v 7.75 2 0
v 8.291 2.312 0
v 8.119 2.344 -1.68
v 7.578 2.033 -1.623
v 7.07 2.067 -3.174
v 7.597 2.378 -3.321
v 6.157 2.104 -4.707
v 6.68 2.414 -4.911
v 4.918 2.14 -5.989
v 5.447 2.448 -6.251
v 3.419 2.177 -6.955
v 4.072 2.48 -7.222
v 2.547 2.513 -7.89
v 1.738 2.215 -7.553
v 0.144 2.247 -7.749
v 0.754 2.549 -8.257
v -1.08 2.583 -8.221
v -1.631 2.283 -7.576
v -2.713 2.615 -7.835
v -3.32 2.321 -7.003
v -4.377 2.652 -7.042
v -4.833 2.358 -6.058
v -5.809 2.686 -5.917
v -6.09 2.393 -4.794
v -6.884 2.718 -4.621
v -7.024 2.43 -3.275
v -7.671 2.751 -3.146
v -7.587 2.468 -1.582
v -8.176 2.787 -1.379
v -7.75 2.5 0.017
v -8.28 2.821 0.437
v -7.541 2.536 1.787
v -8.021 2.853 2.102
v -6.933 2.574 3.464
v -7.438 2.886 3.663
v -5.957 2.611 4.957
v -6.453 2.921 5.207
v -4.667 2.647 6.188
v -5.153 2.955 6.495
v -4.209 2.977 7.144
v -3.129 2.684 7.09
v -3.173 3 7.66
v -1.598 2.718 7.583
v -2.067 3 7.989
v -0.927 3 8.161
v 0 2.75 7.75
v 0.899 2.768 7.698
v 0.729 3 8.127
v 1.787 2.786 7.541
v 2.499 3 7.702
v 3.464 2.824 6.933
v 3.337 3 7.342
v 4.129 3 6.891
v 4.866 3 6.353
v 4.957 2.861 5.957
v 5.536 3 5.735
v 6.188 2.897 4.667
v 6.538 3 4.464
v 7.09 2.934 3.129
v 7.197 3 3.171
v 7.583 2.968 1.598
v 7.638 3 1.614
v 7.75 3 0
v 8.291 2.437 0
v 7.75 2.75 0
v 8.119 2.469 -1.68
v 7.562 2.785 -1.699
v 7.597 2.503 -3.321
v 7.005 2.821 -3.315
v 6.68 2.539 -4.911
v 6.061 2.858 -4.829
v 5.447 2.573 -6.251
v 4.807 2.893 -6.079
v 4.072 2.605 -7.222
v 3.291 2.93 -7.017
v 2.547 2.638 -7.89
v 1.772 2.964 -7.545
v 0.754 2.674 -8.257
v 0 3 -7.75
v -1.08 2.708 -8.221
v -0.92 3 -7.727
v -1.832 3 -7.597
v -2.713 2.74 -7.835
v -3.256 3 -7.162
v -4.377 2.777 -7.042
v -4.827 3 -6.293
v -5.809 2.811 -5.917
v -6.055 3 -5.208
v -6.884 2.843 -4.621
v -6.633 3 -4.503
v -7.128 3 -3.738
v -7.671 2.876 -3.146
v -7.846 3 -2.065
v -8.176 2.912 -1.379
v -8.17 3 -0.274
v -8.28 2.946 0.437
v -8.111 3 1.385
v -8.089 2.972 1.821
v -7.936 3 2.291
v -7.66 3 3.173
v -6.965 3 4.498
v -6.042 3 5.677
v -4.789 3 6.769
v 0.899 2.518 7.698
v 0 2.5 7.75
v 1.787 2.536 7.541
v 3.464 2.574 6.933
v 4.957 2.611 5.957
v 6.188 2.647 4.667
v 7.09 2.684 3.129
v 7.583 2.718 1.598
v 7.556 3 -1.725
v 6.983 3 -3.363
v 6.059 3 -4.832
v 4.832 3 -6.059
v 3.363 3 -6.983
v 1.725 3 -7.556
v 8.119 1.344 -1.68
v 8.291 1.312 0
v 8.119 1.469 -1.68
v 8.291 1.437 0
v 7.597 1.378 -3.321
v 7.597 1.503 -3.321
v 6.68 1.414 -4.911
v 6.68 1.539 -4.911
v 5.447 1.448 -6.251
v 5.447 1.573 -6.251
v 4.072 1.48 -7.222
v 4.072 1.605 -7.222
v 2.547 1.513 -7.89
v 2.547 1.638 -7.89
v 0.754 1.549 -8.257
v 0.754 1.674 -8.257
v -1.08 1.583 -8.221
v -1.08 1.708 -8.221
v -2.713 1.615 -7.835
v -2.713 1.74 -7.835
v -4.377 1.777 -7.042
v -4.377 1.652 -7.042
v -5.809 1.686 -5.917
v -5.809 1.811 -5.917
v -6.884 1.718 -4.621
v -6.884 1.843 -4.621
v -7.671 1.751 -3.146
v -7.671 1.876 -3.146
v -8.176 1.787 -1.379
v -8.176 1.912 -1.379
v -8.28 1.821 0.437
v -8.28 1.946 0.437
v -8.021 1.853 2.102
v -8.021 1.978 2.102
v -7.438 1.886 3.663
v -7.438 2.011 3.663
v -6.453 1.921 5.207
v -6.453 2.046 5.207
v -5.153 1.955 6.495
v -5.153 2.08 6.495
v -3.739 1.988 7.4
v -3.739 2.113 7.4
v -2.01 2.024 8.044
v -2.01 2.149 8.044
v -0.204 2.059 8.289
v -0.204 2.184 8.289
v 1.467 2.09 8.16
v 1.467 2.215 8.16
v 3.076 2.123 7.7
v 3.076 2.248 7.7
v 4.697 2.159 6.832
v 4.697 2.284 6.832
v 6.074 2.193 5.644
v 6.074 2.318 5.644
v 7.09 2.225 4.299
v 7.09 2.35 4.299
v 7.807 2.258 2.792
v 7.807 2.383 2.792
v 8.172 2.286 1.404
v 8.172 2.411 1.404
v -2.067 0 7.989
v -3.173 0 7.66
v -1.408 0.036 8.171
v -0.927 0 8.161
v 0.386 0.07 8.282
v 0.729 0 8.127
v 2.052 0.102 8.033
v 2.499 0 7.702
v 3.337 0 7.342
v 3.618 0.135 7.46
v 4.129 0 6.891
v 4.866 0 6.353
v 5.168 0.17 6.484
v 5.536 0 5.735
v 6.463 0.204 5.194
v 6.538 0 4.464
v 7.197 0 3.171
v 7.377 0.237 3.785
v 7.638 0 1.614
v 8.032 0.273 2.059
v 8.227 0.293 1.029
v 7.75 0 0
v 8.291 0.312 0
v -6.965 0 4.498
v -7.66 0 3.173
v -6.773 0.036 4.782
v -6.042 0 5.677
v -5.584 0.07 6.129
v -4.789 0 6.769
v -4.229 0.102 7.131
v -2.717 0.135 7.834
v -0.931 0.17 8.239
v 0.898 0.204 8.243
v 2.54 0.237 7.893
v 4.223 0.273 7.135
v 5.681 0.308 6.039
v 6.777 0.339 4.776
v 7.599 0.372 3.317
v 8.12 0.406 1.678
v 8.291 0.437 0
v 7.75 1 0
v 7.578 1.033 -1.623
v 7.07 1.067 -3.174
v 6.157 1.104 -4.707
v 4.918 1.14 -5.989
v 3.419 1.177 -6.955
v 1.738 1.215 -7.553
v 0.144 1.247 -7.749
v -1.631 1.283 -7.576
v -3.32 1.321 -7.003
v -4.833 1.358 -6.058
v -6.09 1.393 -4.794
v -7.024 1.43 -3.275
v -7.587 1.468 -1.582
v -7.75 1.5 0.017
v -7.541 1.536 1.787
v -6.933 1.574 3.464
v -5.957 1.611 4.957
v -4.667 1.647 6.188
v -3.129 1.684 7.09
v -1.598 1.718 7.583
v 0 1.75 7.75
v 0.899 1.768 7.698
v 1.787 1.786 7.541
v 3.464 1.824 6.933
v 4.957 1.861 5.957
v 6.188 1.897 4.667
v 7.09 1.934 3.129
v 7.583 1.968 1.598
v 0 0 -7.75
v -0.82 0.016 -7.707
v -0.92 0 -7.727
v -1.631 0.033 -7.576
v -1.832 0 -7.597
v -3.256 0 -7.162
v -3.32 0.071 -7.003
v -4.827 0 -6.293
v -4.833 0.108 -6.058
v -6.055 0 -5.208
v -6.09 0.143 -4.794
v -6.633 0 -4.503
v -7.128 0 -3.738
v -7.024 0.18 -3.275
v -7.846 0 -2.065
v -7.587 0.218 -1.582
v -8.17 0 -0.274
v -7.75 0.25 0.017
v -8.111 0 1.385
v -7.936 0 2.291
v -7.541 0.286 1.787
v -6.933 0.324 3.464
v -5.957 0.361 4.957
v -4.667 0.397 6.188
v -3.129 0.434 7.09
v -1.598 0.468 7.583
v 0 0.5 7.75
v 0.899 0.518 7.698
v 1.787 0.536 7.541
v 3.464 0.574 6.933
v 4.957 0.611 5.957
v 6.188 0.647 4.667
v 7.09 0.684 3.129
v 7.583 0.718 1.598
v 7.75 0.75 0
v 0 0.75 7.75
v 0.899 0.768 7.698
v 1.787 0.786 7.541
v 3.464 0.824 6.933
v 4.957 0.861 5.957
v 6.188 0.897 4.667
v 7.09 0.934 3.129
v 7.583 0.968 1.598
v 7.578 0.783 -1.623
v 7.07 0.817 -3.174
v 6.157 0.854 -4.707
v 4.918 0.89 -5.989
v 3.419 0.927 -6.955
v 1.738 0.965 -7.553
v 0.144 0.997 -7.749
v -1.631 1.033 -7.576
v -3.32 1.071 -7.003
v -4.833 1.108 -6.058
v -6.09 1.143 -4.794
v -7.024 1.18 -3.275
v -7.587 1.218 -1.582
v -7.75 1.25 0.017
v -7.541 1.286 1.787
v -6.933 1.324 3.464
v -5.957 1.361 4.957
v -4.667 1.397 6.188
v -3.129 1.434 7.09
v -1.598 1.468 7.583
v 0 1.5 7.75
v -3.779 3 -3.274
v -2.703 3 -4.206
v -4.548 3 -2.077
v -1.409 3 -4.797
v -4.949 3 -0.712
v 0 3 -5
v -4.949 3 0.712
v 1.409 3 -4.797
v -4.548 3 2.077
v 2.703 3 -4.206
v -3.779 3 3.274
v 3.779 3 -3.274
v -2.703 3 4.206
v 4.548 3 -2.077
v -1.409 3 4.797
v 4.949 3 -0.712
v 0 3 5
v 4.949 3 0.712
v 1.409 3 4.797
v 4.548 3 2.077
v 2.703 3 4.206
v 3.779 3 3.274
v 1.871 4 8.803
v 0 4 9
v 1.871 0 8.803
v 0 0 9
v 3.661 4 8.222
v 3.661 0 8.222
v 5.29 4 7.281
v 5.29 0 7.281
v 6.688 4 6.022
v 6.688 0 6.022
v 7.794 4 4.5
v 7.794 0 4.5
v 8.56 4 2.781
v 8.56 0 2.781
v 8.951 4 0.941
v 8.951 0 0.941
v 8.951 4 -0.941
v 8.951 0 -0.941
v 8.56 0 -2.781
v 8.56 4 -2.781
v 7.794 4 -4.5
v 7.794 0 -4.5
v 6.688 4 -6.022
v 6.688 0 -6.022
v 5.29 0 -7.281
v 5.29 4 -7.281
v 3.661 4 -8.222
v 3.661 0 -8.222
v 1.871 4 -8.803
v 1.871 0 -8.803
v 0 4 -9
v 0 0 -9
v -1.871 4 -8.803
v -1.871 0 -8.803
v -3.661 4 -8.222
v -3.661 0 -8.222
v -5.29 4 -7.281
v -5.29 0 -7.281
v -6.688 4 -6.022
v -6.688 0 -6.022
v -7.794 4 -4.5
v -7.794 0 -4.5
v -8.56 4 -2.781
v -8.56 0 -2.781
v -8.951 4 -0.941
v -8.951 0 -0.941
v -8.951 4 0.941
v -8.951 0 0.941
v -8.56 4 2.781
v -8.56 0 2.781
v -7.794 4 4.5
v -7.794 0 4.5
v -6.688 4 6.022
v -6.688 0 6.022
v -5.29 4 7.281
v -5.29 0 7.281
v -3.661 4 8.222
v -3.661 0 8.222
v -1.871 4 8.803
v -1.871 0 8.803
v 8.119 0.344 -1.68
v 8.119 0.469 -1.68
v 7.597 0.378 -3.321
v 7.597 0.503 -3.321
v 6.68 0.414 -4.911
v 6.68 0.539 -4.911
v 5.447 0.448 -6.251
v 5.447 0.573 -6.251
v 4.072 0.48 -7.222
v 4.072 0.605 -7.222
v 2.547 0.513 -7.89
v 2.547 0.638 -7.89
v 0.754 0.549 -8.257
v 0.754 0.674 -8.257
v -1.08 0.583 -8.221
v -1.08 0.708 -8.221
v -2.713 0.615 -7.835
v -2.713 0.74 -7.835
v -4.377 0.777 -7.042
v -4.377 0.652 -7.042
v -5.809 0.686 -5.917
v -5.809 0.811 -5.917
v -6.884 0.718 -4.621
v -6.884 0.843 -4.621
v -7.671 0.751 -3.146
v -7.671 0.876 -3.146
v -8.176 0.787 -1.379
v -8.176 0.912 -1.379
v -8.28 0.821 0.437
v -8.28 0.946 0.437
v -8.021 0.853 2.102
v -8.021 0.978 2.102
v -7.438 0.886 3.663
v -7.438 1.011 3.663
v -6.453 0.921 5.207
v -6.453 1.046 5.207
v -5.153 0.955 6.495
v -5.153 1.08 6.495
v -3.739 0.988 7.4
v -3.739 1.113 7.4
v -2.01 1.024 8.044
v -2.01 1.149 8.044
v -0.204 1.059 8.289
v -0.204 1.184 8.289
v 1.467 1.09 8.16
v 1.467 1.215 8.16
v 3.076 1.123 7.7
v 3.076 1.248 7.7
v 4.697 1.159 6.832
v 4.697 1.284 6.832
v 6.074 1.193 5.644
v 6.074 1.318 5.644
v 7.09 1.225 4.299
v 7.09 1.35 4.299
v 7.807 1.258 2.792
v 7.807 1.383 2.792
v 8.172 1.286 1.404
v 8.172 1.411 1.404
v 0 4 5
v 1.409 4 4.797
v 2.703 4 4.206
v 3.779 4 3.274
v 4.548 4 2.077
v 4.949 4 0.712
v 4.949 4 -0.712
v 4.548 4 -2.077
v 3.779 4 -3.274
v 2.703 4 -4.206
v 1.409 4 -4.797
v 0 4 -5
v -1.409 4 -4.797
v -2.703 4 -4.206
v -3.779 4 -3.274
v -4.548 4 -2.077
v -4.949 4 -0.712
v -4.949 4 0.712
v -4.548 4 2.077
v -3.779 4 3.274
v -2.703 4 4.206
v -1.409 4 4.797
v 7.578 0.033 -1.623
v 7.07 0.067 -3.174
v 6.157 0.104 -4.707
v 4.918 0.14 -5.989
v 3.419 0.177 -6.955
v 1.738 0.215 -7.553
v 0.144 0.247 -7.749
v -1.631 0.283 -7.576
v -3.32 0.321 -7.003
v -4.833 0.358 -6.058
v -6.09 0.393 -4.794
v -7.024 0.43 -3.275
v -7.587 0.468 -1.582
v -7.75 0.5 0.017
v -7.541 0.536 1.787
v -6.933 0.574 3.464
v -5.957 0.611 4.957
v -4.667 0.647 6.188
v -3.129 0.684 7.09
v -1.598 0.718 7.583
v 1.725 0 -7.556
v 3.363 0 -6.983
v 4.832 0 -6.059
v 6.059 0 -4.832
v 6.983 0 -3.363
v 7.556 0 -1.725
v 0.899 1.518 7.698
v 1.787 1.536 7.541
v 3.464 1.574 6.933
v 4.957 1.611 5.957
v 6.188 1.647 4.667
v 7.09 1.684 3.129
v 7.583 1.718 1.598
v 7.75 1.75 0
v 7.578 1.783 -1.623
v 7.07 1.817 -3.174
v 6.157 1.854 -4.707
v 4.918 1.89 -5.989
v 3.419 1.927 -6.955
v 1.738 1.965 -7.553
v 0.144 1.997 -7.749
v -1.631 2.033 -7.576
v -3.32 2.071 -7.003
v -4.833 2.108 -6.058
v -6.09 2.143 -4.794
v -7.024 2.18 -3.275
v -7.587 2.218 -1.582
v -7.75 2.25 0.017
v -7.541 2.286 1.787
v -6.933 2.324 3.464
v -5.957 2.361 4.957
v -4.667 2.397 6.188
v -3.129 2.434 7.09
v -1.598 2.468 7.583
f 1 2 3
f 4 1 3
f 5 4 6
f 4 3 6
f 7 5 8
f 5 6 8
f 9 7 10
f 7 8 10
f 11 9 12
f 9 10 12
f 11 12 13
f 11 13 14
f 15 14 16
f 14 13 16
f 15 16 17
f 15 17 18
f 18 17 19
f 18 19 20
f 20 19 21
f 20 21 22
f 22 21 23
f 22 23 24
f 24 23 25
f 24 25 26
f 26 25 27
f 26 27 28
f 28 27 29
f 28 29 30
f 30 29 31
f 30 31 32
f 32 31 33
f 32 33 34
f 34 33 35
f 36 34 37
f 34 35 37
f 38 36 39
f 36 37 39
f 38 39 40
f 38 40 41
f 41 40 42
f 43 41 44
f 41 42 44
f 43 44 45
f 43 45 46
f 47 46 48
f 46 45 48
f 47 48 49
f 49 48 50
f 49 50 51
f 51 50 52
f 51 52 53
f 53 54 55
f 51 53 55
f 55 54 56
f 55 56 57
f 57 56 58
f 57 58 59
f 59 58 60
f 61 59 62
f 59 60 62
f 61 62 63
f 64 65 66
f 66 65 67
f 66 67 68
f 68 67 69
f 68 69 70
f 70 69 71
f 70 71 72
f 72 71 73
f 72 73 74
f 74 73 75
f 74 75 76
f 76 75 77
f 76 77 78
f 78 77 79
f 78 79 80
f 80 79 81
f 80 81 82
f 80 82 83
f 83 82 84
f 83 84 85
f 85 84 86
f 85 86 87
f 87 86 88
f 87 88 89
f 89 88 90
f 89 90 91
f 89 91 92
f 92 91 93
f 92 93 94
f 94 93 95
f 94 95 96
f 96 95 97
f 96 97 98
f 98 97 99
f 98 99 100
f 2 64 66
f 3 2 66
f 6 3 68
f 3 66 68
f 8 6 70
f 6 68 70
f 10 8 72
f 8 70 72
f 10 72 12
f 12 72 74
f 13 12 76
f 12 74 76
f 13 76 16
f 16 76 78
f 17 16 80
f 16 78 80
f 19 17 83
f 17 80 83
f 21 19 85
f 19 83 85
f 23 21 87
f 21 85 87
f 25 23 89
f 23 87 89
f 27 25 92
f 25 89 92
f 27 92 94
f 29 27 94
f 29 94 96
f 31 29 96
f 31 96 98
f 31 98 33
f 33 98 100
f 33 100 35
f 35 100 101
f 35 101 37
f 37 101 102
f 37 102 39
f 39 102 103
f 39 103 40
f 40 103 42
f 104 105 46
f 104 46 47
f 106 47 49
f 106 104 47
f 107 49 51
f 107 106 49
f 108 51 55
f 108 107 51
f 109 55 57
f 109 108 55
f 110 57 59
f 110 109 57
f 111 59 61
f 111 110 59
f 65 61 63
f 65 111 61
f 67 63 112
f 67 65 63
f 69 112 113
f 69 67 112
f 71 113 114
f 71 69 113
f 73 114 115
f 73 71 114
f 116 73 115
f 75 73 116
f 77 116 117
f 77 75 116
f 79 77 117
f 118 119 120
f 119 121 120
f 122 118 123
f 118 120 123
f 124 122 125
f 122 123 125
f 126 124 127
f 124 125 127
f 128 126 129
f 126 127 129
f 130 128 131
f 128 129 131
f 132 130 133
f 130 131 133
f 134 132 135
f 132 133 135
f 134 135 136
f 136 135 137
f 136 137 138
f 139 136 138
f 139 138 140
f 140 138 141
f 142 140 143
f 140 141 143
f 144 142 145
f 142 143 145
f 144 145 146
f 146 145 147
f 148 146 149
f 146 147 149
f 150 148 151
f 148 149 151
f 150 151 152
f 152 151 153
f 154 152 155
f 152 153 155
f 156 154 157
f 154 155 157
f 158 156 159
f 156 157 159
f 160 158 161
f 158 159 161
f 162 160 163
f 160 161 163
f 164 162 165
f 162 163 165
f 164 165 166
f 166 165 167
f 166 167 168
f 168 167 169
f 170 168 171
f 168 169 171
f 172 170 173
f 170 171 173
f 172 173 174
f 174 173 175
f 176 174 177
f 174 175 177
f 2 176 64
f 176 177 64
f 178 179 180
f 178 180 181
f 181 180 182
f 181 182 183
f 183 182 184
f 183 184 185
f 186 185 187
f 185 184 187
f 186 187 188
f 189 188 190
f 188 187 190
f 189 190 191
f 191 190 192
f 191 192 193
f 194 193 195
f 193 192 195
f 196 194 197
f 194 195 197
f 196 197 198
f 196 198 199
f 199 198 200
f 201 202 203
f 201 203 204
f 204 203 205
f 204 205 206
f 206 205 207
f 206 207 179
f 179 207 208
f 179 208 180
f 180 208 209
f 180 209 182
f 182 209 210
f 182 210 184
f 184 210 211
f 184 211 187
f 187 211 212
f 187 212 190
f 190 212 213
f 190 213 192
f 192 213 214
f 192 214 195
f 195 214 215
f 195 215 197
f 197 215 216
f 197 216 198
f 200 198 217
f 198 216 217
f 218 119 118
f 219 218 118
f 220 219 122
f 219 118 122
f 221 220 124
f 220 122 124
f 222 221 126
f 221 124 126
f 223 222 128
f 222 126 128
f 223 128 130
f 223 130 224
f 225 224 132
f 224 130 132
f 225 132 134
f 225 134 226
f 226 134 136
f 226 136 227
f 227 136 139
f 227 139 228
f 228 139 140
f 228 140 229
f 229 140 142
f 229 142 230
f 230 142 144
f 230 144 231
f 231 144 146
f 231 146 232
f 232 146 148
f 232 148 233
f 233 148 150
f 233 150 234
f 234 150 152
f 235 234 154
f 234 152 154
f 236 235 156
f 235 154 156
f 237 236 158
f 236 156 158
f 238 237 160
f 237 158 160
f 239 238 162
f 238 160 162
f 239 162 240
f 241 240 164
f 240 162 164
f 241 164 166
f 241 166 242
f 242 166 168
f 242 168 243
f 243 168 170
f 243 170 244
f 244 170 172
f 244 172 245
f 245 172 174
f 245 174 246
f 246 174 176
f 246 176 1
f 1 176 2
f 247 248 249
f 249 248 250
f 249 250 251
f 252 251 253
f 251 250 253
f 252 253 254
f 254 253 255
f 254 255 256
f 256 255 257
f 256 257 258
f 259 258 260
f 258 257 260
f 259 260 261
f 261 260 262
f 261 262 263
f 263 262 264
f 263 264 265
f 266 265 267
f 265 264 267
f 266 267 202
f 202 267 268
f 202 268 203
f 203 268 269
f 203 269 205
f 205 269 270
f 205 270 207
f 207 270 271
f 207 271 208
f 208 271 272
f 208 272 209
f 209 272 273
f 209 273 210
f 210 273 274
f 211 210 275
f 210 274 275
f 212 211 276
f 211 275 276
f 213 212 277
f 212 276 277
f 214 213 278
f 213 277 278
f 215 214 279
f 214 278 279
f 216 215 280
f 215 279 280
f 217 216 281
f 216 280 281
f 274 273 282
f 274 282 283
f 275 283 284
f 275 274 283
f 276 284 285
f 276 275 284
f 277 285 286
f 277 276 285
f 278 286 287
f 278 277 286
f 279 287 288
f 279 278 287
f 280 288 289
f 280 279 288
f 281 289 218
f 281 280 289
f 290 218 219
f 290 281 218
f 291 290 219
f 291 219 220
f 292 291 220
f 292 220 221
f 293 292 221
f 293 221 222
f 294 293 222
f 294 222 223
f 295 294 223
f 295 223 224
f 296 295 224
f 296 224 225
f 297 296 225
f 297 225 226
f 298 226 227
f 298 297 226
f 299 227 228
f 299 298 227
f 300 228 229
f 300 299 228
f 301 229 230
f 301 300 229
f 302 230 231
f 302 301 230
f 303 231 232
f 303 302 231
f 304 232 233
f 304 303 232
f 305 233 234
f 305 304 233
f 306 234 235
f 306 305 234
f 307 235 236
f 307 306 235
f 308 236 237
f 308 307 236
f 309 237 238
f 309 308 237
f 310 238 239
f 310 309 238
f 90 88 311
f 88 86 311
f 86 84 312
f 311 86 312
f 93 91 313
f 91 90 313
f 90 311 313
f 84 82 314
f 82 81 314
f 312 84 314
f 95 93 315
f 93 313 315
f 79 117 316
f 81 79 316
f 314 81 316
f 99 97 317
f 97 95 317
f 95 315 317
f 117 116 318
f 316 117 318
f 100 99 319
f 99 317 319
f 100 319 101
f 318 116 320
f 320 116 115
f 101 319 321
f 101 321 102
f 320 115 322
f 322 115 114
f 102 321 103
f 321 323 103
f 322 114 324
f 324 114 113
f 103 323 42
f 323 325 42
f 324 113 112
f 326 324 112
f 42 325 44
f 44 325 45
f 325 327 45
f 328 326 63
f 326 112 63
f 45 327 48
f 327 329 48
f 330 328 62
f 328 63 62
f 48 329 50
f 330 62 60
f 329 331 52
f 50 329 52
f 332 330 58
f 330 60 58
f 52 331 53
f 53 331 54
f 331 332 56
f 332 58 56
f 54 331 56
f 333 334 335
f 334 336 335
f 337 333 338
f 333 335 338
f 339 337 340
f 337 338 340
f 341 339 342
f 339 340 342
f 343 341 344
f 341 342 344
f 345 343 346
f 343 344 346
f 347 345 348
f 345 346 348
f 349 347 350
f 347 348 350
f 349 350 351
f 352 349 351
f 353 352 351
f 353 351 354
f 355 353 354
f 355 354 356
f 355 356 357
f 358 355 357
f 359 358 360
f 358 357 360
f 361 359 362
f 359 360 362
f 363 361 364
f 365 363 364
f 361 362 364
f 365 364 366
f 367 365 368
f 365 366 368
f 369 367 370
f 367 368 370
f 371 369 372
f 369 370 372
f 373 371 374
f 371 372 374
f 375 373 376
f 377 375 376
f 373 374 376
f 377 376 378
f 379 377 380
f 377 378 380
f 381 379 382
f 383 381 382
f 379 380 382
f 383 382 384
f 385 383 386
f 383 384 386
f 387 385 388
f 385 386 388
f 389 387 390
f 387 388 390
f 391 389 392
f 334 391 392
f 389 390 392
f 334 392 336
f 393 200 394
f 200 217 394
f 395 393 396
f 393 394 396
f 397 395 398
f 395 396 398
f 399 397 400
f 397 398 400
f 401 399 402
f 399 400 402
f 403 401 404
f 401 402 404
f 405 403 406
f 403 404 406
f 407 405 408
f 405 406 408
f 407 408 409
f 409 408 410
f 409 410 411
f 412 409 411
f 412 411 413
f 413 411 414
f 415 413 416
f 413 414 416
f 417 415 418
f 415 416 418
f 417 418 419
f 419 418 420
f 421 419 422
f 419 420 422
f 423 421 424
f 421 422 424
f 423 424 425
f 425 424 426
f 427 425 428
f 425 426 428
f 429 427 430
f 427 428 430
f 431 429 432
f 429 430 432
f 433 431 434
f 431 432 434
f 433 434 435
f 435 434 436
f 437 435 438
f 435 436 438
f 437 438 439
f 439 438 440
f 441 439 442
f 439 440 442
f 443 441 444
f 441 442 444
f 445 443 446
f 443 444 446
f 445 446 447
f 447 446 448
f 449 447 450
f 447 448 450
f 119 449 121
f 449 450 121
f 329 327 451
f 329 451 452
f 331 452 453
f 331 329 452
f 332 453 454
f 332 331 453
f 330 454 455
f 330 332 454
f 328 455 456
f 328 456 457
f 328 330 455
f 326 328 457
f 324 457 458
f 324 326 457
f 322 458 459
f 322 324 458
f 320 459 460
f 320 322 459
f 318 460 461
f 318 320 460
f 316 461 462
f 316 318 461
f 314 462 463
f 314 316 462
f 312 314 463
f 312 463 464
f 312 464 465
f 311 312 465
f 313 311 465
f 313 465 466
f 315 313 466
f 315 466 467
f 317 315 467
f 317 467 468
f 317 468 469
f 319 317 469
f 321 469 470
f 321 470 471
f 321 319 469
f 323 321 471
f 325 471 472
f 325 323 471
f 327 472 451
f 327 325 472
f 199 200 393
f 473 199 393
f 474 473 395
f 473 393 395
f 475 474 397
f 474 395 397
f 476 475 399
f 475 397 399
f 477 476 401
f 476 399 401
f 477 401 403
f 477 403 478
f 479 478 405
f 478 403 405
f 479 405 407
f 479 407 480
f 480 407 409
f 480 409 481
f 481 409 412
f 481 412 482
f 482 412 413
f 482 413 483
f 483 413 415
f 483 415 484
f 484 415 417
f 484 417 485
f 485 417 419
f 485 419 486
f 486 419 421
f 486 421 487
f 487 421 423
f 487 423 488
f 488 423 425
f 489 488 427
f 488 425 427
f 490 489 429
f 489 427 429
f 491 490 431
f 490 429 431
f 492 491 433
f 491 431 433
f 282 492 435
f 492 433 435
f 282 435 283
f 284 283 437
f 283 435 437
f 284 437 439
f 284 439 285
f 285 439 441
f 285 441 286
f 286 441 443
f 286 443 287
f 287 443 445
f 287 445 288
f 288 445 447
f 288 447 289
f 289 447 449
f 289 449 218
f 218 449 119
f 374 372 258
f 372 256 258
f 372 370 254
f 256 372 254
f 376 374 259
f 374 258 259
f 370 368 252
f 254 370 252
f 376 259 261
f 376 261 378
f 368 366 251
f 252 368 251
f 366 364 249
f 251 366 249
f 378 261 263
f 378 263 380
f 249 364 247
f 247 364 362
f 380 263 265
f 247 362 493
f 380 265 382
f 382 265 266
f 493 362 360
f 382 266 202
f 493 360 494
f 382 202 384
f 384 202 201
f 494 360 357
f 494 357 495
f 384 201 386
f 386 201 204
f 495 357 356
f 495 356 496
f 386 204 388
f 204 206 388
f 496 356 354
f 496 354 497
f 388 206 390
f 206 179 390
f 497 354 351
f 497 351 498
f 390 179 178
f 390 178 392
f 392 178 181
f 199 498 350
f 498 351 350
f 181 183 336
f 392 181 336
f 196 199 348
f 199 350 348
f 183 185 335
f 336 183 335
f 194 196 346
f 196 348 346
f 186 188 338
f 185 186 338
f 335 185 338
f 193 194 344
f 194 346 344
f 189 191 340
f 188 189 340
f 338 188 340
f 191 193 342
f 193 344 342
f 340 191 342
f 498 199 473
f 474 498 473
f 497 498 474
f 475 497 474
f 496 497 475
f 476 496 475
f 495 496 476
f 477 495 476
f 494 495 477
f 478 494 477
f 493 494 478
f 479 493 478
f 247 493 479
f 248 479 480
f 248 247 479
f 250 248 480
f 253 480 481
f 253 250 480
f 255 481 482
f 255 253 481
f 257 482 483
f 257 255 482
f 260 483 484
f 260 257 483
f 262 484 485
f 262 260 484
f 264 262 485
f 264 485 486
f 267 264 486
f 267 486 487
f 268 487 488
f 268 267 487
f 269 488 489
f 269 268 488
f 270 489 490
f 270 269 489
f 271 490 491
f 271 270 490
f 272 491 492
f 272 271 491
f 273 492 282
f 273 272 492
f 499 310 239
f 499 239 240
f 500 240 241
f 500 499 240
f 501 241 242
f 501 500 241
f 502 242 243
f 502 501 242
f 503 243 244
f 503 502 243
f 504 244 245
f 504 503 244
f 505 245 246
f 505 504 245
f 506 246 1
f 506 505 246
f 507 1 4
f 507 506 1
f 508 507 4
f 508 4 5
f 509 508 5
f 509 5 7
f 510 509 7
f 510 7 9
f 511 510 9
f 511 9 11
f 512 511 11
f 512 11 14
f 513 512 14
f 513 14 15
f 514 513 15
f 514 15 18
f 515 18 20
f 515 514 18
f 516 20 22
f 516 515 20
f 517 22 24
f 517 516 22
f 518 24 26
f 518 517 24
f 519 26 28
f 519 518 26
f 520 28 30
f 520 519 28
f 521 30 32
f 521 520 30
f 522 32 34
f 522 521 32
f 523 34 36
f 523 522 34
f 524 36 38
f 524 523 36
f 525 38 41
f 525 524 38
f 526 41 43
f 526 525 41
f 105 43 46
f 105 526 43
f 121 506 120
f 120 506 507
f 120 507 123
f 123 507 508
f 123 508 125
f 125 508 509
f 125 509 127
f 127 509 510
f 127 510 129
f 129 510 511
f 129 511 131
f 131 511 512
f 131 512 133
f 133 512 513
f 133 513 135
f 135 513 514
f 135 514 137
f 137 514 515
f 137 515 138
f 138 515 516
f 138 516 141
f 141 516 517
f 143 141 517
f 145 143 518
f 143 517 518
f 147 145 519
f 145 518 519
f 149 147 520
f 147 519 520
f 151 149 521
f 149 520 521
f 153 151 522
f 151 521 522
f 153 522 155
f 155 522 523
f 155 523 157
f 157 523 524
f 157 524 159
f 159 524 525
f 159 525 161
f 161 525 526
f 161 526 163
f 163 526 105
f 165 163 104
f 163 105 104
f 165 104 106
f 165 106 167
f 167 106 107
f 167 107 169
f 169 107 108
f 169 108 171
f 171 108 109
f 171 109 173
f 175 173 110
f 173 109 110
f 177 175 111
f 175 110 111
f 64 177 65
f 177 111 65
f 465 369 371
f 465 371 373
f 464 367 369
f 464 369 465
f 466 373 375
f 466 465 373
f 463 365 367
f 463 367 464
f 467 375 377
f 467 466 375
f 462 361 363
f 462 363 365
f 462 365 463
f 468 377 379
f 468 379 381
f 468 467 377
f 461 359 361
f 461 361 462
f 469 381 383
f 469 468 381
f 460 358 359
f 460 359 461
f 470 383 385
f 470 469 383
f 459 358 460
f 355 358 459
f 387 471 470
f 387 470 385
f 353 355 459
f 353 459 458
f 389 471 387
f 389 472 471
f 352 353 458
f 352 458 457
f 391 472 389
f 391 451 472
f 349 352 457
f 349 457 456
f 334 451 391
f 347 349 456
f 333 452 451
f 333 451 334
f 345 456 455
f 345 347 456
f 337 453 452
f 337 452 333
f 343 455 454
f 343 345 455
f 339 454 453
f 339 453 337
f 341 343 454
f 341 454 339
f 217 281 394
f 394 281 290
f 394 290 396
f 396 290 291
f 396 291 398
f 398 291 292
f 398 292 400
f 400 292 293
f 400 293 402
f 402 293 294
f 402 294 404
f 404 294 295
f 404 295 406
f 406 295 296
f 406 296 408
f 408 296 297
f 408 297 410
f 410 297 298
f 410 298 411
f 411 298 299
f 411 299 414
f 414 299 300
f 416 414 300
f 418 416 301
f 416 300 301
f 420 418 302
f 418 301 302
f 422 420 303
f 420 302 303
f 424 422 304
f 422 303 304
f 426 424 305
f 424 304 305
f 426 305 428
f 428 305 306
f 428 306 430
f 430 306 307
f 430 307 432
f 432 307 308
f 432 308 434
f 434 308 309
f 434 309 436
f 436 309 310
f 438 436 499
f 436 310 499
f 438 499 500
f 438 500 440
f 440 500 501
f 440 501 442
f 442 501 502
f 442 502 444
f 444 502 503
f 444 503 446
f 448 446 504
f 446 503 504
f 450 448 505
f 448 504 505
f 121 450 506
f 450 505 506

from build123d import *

# Parameters (mm, degrees)
SKETCH1_R           = 9
SKETCH1_R_2         = 7.75
BOSS_EXTRUDE1_DEPTH = 3
SKETCH2_R           = 9
SKETCH2_R_2         = 5
BOSS_EXTRUDE2_DEPTH = 1
THREAD2_PITCH       = 1
THREAD2_TO          = 4


with BuildPart() as part:
    # Sketch1 → Boss-Extrude1 (new body)
    with BuildSketch(Plane(origin=(0, 0, 0), x_dir=(1, 0, 0), z_dir=(0, 1, 0))):
        with Locations(Location((0, 0, 0), (0, 0, 270))):
            Circle(SKETCH1_R)
        with Locations(Location((0, 0, 0), (0, 0, 270))):
            Circle(SKETCH1_R_2, mode=Mode.SUBTRACT)
    extrude(amount=BOSS_EXTRUDE1_DEPTH)

    # Sketch2 → Boss-Extrude2 (add)
    with BuildSketch(Plane(origin=(0, 3, 0), x_dir=(1, 0, 0), z_dir=(0, 1, 0))):
        with Locations(Location((0, 0, 0), (0, 0, 270))):
            Circle(SKETCH2_R)
        with Locations(Location((0, 0, 0), (0, 0, 270))):
            Circle(SKETCH2_R_2, mode=Mode.SUBTRACT)
    extrude(amount=BOSS_EXTRUDE2_DEPTH)

    # Thread2: arcs per turn and ends read off the stored shape
    # Thread2: the profile of Thread Profile2 profile screwed along a right-hand helix through 4 turns, 8 arcs to a turn; built about Z, then put on its axis
    thread2_z = Axis((0, 0, 0), (0, 0, 1))
    thread2_corners = [(7.7497, 0, -0.000173205), (8.291265875, 0, 0.312499999), (8.291265875, 0, 0.437499999), (7.7497, 0, 0.750173202)]
    with BuildLine(mode=Mode.PRIVATE) as thread2_profile:
        Line(thread2_corners[0], thread2_corners[1])
        Line(thread2_corners[1], thread2_corners[2])
        Line(thread2_corners[2], thread2_corners[3])
        Line(thread2_corners[3], thread2_corners[0])
    thread2_cap = Face(thread2_profile.wire())
    thread2_turn_angles = [0, 22.5, 45, 67.5, 90, 112.5, 135, 157.5, 180, 202.5, 225, 247.5, 270, 292.5, 315, 337.5, 360]
    thread2_turn_weights = [1, 0.9238795325112867, 1, 0.9238795325112867, 1, 0.9238795325112867, 1, 0.9238795325112867, 1, 0.9238795325112867, 1, 0.9238795325112867, 1, 0.9238795325112867, 1, 0.9238795325112867, 1]
    thread2_turn_rails = [Edge.make_bspline([Vector(p[0], p[1], 0).rotate(thread2_z, thread2_turn_angles[k]) / thread2_turn_weights[k] + Vector(0, 0, p[2] + THREAD2_PITCH * thread2_turn_angles[k] / 360) for k in range(17)], [0, 0, 0, 1, 1, 2, 2, 3, 3, 4, 4, 5, 5, 6, 6, 7, 7, 8, 8, 8], 2, thread2_turn_weights) for p in thread2_corners]
    thread2_turn_sides = [Face.make_surface_from_curves(thread2_turn_rails[p[0]], thread2_turn_rails[p[1]]) for p in [(0, 1), (1, 2), (2, 3), (3, 0)]]
    thread2 = Plane(origin=(0, -1, 0), x_dir=(1, 0, 0), z_dir=(0, 1, 0)) * split(Solid(Shell([*[p.moved(Location((0, 0, THREAD2_PITCH * i))) for i in range(4) for p in thread2_turn_sides], thread2_cap, thread2_cap.rotate(thread2_z, 1440).moved(Location((0, 0, THREAD2_PITCH * 1440 / 360)))])), bisect_by=Plane.XY.offset(THREAD2_TO), keep=Keep.BOTTOM, mode=Mode.PRIVATE)
    add(thread2, mode=Mode.SUBTRACT)


solid = part.part
